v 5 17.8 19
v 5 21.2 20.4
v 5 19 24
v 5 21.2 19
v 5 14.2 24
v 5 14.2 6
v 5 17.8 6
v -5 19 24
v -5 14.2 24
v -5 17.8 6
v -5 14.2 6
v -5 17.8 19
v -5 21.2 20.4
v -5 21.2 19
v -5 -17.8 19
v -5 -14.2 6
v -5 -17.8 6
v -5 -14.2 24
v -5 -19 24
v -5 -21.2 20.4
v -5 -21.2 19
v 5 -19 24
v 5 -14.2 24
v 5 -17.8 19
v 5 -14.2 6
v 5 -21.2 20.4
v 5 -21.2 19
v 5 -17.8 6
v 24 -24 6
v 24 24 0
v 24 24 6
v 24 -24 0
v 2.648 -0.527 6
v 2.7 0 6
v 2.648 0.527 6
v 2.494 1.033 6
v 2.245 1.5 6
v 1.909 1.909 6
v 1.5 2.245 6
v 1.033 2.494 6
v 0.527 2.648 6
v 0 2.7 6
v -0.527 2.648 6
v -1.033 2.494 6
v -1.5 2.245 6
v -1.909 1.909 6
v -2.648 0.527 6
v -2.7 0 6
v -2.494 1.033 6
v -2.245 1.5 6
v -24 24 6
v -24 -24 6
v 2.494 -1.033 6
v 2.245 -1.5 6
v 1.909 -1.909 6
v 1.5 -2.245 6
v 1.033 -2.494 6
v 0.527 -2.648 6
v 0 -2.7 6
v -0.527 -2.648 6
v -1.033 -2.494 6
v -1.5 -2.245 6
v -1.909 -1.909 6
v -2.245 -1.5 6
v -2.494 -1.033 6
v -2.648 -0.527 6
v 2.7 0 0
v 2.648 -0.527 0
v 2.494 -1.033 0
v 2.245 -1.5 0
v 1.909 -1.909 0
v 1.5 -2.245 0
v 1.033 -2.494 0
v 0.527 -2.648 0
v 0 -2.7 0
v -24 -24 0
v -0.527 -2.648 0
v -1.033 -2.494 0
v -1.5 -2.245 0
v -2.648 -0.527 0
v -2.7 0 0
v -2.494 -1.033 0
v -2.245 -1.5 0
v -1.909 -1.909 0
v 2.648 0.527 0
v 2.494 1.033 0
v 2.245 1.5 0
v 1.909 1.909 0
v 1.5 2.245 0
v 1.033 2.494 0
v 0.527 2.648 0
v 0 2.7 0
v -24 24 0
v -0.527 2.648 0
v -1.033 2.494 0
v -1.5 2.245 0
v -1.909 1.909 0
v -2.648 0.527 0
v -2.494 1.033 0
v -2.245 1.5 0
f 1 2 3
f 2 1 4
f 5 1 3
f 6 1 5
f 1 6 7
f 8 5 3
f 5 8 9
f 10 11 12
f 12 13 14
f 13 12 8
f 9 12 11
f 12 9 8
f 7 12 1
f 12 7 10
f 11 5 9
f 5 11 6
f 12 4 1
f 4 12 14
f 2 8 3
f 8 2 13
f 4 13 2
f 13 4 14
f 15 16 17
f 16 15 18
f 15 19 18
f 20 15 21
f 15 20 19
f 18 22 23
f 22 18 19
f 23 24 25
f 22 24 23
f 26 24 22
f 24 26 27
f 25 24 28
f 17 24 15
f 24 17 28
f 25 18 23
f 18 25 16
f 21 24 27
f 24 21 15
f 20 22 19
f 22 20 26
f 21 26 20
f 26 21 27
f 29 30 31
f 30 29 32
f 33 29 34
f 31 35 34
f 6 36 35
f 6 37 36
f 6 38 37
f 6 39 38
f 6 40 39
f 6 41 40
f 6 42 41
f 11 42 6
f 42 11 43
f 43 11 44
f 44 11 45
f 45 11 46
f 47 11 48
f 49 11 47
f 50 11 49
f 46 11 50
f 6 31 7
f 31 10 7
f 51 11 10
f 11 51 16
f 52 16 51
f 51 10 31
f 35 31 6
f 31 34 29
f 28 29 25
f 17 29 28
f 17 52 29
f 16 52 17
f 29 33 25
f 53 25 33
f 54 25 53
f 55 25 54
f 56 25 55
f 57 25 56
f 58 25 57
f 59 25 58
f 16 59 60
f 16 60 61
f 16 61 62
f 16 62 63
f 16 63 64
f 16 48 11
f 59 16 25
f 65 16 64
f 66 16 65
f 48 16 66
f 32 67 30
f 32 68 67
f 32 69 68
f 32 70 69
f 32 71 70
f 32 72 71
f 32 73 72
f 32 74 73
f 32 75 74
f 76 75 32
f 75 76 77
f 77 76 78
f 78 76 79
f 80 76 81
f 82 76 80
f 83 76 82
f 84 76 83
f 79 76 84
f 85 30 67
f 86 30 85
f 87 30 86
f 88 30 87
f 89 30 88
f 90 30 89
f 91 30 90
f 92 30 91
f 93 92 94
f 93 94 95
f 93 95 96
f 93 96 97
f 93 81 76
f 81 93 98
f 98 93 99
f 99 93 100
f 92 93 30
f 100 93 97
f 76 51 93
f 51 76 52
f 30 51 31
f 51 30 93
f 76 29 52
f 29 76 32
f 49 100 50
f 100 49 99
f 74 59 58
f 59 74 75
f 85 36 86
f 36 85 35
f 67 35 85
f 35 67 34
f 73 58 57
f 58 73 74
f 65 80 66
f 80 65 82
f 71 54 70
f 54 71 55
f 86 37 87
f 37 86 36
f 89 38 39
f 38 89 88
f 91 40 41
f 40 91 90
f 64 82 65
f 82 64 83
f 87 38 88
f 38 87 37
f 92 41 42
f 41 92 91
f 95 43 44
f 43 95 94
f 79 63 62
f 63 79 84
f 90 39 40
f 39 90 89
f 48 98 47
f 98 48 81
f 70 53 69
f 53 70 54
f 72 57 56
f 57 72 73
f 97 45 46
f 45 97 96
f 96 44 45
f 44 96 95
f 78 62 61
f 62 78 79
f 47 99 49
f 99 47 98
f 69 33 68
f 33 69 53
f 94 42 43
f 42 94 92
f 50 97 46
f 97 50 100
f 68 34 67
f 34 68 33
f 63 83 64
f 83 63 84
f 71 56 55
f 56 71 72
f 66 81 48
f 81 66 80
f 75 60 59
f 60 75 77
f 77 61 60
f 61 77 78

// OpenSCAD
$fn = 32;

// ----------------------------------------------------------------------
// Snap-fit latch: 2 arms, 18 mm tall, 3.6 mm undercut hooks
// ----------------------------------------------------------------------

// --- parameters (mm) ---
base_d = 48;              // base plate depth
base_h = 6;               // base plate thickness
span = 32;                // distance between opposite arms
arm_t = 3.6;              // arm thickness
arm_d = 10;               // arm width
height = 18;              // free arm length
head_len = 3.6;           // hook reach
head_h = 5;               // hook height
lead = 1.4;               // lead-in ramp thickness
bore_d = 5.4;             // base fixing bore
top_z = 24;               // height of the arm tips above the base

arms = 2;

difference() {
  union() {
    /* base plate, centred on the arm ring */
    translate([-24, -24, 0]) cube([base_d, base_d, base_h]);
    for (a = [0 : 360 / arms : 359]) rotate([0, 0, a]) {
    /* arm, sunk 0.5 mm into the base */
    translate([-arm_d / 2, span / 2 - arm_t / 2, base_h - 0.5]) cube([arm_d, arm_t, height + 0.5]);
    /* hook: a convex hull of a tall inner block and a thin outer lip
       gives a flat undercut below and a lead-in ramp on top */
    hull() {
      translate([-arm_d / 2, span / 2 + arm_t / 2 - 0.6, top_z - head_h]) cube([arm_d, lead + 0.4, head_h]);
      translate([-arm_d / 2, span / 2 + arm_t / 2 - 0.2, top_z - head_h]) cube([arm_d, head_len, lead]);
    }
    }
  }
  translate([0, 0, -2.5]) cylinder(h = base_h + 5, d = bore_d);
}
